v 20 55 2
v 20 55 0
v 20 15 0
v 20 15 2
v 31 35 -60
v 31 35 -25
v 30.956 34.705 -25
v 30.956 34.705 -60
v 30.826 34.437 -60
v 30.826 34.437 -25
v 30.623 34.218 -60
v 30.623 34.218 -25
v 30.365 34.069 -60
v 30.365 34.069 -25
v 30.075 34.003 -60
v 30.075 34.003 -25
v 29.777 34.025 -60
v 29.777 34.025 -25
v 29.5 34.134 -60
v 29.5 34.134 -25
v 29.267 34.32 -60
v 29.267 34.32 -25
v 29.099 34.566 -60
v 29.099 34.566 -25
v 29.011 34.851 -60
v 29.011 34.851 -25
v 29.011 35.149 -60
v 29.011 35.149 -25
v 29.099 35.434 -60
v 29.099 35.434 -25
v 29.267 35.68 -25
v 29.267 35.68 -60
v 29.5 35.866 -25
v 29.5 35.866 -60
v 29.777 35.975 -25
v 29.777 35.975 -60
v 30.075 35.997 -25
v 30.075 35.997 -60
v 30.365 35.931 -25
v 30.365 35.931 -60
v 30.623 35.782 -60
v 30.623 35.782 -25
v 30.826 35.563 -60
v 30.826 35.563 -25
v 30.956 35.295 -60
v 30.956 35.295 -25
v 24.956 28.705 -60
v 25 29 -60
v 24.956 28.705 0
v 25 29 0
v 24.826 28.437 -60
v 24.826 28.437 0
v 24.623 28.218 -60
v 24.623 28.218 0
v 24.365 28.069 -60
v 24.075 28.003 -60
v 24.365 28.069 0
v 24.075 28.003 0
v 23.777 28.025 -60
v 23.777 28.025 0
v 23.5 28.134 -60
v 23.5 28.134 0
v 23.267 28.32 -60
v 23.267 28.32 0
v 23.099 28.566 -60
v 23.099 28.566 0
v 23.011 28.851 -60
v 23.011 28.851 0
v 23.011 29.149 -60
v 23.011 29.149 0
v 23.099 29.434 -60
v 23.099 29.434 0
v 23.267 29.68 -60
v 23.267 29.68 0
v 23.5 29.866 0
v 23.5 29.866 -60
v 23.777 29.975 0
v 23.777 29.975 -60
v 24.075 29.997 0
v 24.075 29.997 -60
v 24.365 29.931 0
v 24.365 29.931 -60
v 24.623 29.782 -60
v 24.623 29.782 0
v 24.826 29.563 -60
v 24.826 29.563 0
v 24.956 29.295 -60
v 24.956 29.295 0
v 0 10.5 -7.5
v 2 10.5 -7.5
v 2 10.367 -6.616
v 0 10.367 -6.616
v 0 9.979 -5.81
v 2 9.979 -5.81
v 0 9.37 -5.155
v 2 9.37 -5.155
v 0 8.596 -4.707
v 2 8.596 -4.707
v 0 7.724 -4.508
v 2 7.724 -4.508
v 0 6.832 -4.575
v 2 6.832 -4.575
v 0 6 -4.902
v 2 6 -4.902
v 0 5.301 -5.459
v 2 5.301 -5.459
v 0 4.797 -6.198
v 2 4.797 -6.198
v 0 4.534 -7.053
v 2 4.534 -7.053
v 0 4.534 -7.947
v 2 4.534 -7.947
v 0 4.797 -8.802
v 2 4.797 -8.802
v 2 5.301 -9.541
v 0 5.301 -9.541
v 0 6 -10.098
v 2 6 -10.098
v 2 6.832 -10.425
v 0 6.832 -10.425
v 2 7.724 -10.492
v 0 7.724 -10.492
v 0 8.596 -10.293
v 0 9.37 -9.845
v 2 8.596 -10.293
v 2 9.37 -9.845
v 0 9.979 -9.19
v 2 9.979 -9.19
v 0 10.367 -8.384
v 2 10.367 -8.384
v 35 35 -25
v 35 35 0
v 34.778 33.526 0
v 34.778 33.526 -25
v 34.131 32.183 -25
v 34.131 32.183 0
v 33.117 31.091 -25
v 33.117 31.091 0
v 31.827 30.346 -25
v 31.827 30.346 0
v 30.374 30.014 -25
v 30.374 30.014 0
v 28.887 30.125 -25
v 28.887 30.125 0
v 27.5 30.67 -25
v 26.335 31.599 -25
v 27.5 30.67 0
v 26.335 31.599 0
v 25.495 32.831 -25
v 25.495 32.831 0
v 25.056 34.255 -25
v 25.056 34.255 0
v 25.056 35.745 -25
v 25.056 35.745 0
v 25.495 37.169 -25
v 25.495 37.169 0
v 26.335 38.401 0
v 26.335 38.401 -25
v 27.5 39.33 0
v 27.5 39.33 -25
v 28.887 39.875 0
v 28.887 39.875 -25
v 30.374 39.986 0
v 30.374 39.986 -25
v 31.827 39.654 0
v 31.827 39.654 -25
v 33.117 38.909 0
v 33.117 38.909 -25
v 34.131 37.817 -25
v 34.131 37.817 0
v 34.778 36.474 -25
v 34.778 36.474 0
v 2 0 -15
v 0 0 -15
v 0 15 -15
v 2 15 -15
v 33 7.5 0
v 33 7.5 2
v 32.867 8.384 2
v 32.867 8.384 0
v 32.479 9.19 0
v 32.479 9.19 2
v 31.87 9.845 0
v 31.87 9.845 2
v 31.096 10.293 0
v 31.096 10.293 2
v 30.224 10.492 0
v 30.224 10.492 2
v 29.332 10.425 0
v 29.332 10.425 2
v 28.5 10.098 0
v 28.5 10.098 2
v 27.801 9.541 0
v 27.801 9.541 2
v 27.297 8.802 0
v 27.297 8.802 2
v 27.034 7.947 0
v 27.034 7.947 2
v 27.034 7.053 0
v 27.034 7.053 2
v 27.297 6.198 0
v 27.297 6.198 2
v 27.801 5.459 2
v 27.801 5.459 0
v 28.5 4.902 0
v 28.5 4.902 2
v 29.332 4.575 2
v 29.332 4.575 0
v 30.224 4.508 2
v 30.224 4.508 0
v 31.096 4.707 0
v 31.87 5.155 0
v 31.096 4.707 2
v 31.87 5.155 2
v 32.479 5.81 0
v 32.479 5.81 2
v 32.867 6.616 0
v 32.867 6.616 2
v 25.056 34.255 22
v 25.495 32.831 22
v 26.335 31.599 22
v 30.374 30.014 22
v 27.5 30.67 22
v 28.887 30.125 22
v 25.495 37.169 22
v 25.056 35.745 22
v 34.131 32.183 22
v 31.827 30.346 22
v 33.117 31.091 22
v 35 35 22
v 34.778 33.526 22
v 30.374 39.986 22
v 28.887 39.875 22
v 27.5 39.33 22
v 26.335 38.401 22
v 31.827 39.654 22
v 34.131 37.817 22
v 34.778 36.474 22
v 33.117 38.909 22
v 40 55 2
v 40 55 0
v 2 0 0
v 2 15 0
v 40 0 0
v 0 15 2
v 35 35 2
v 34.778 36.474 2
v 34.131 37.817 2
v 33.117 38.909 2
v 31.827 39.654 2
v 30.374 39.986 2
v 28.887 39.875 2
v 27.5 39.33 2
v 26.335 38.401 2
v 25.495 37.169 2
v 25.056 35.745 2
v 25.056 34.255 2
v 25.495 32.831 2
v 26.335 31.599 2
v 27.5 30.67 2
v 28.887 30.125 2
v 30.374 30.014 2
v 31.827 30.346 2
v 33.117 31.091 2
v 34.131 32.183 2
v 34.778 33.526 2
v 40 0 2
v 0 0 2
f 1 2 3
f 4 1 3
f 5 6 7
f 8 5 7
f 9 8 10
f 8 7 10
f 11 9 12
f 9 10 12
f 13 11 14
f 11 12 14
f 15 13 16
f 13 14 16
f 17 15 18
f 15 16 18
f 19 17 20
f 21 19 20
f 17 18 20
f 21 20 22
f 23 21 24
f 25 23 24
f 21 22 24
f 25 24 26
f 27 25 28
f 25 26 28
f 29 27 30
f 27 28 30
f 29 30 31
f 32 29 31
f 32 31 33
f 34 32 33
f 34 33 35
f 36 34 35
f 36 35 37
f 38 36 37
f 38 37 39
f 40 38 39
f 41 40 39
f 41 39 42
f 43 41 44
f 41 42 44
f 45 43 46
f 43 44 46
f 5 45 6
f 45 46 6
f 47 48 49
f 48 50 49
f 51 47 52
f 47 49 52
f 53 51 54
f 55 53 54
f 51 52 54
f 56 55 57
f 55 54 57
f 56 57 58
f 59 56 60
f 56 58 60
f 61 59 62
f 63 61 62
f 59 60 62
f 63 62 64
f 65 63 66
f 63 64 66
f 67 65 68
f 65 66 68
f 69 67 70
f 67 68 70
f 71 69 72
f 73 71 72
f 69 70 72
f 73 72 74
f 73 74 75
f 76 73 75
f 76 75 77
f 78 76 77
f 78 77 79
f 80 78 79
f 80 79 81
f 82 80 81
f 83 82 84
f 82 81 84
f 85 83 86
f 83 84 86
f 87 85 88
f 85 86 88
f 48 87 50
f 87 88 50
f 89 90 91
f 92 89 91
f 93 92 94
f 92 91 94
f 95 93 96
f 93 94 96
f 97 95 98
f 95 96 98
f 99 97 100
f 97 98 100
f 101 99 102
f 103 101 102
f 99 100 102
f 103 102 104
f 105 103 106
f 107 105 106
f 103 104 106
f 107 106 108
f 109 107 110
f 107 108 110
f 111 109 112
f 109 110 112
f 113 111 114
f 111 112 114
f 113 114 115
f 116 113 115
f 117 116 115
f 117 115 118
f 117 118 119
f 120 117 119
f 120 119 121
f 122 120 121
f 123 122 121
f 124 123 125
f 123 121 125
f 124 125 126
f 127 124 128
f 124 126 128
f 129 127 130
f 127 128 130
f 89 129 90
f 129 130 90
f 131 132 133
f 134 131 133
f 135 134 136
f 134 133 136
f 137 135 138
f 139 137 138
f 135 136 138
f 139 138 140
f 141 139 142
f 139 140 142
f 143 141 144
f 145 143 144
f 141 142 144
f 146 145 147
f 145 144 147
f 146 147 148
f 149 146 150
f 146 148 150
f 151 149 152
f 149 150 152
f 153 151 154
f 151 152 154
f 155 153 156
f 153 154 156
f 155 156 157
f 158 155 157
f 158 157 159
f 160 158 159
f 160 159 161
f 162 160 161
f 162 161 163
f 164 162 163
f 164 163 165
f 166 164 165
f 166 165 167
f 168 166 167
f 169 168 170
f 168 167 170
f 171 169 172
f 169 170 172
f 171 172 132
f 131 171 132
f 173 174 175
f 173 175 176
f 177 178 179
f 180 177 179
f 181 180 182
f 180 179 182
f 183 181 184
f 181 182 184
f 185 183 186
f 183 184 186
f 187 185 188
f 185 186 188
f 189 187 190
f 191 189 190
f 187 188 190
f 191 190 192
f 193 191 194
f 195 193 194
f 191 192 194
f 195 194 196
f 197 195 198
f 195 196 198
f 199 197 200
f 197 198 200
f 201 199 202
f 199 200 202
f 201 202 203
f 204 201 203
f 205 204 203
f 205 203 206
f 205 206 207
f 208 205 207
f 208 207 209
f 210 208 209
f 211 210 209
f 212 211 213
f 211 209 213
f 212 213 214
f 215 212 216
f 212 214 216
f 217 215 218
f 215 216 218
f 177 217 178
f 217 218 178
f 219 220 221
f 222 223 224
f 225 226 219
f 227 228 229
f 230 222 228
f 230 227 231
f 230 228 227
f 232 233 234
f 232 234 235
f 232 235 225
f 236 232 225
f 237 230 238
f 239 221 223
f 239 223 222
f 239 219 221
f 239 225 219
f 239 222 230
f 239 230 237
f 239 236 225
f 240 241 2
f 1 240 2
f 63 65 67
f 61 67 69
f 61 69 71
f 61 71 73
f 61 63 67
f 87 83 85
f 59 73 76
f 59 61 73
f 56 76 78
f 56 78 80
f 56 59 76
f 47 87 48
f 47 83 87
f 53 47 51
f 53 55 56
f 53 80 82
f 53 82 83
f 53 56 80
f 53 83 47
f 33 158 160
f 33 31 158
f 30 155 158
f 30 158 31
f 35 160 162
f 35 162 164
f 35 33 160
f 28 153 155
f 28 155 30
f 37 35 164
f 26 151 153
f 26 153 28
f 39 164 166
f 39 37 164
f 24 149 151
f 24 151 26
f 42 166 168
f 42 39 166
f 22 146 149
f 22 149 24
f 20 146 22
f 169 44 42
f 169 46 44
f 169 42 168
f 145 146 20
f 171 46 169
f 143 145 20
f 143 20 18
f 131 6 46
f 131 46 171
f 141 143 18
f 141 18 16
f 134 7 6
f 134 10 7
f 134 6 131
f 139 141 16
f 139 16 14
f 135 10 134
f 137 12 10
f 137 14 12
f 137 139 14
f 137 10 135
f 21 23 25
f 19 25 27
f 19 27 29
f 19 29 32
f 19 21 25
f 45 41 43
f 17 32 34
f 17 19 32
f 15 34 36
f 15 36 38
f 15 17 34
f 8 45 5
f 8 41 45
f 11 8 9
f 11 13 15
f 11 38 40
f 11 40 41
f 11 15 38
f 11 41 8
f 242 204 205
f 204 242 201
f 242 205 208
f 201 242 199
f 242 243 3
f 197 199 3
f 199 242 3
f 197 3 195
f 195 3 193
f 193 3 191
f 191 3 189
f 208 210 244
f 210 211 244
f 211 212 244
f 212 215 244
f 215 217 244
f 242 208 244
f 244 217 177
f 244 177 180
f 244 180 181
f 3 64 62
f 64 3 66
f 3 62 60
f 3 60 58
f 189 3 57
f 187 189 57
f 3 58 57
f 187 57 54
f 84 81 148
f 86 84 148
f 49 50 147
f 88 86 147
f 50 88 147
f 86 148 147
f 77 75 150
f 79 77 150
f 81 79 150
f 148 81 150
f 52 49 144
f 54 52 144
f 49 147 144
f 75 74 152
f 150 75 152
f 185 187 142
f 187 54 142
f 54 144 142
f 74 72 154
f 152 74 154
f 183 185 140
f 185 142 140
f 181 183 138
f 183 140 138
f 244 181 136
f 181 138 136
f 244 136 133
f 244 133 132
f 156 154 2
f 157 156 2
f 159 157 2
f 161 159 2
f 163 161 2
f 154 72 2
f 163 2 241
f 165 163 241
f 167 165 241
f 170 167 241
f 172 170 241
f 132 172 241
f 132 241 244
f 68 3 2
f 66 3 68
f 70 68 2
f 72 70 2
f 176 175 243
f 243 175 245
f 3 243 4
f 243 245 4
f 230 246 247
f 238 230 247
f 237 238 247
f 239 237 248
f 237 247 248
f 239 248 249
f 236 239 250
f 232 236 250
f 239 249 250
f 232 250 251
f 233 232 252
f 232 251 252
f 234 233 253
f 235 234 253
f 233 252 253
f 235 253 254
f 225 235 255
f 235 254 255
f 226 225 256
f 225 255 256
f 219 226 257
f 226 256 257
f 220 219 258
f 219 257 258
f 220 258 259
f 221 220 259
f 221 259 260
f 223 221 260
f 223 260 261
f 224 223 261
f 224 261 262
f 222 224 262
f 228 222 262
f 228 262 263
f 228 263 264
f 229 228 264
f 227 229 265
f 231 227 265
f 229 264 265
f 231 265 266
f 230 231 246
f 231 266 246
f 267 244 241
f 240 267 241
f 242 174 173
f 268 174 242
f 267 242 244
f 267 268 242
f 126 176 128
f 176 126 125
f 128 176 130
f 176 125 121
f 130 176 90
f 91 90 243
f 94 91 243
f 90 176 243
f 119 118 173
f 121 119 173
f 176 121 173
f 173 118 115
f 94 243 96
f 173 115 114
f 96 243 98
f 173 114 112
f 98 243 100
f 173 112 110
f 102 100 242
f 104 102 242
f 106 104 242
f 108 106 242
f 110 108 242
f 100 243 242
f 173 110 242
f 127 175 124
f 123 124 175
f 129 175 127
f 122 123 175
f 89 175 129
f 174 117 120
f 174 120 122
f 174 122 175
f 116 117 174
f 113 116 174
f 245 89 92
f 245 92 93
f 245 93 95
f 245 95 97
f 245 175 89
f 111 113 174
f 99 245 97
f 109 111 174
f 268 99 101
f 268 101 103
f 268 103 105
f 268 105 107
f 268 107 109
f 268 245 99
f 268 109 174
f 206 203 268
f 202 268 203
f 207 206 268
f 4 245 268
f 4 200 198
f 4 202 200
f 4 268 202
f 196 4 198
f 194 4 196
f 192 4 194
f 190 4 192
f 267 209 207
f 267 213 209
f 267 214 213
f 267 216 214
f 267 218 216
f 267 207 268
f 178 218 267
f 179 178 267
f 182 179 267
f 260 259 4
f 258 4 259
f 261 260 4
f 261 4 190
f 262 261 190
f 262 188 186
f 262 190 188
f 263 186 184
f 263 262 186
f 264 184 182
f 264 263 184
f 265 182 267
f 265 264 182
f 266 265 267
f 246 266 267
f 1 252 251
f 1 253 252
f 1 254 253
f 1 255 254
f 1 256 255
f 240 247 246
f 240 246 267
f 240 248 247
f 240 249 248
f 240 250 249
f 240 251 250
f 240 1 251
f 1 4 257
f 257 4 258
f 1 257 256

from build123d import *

# Parameters (mm, degrees)
PAD_DEPTH       = 2
SKETCH001_R     = 5
PAD001_DEPTH    = 20
SKETCH002_W     = 2
SKETCH002_H     = 15
PAD002_DEPTH    = 15
SKETCH003_R     = 5
SKETCH003_R_2   = 1
PAD003_DEPTH    = 25
SKETCH004_R     = 1
PAD004_DEPTH    = 35
SKETCH005_R     = 3
POCKET_DEPTH    = 2
SKETCH006_R     = 3
POCKET001_DEPTH = 2


with BuildPart() as part:
    # Sketch → Pad (new body)
    with BuildSketch(Plane.XY):
        Polygon((0, 0), (40, 0), (40, 55), (20, 55), (20, 15), (0, 15), align=None)
    extrude(amount=PAD_DEPTH)

    # Sketch001 (on Face8 of Pad) → Pad001 (join)
    with BuildSketch(Plane.XY.offset(2)):
        with Locations((30, 35)):
            Circle(SKETCH001_R)
    extrude(amount=PAD001_DEPTH)

    # Sketch002 (on Face4 of Pad001) → Pad002 (join)
    with BuildSketch(Plane(origin=(0, 0, 0), x_dir=(1, 0, 0), z_dir=(0, 0, -1))):
        with Locations((1, -7.5)):
            Rectangle(SKETCH002_W, SKETCH002_H)
    extrude(amount=PAD002_DEPTH)

    # Sketch003 (on Face10 of Pad002) → Pad003 (join)
    with BuildSketch(Plane(origin=(0, 0, 0), x_dir=(1, 0, 0), z_dir=(0, 0, -1))):
        with Locations((30, -35)):
            Circle(SKETCH003_R)
        with Locations((24, -29)):
            Circle(SKETCH003_R_2)
    extrude(amount=PAD003_DEPTH)

    # Sketch004 (on Face19 of Pad003) → Pad004 (join)
    with BuildSketch(Plane(origin=(0, 0, -25), x_dir=(1, 0, 0), z_dir=(0, 0, -1))):
        with Locations((24, -29)):
            Circle(SKETCH004_R)
        with Locations((30, -35)):
            Circle(SKETCH004_R)
    extrude(amount=PAD004_DEPTH)

    # Sketch005 (on Face1 of Pad004) → Pocket (cut)
    with BuildSketch(Plane.XY.offset(2)):
        with Locations((30, 7.5)):
            Circle(SKETCH005_R)
    extrude(amount=-POCKET_DEPTH, mode=Mode.SUBTRACT)

    # Sketch006 (on Face16 of Pocket) → Pocket001 (cut)
    with BuildSketch(Plane.YZ.offset(2)):
        with Locations((7.5, -7.5)):
            Circle(SKETCH006_R)
    extrude(amount=-POCKET001_DEPTH, mode=Mode.SUBTRACT)


solid = part.part
